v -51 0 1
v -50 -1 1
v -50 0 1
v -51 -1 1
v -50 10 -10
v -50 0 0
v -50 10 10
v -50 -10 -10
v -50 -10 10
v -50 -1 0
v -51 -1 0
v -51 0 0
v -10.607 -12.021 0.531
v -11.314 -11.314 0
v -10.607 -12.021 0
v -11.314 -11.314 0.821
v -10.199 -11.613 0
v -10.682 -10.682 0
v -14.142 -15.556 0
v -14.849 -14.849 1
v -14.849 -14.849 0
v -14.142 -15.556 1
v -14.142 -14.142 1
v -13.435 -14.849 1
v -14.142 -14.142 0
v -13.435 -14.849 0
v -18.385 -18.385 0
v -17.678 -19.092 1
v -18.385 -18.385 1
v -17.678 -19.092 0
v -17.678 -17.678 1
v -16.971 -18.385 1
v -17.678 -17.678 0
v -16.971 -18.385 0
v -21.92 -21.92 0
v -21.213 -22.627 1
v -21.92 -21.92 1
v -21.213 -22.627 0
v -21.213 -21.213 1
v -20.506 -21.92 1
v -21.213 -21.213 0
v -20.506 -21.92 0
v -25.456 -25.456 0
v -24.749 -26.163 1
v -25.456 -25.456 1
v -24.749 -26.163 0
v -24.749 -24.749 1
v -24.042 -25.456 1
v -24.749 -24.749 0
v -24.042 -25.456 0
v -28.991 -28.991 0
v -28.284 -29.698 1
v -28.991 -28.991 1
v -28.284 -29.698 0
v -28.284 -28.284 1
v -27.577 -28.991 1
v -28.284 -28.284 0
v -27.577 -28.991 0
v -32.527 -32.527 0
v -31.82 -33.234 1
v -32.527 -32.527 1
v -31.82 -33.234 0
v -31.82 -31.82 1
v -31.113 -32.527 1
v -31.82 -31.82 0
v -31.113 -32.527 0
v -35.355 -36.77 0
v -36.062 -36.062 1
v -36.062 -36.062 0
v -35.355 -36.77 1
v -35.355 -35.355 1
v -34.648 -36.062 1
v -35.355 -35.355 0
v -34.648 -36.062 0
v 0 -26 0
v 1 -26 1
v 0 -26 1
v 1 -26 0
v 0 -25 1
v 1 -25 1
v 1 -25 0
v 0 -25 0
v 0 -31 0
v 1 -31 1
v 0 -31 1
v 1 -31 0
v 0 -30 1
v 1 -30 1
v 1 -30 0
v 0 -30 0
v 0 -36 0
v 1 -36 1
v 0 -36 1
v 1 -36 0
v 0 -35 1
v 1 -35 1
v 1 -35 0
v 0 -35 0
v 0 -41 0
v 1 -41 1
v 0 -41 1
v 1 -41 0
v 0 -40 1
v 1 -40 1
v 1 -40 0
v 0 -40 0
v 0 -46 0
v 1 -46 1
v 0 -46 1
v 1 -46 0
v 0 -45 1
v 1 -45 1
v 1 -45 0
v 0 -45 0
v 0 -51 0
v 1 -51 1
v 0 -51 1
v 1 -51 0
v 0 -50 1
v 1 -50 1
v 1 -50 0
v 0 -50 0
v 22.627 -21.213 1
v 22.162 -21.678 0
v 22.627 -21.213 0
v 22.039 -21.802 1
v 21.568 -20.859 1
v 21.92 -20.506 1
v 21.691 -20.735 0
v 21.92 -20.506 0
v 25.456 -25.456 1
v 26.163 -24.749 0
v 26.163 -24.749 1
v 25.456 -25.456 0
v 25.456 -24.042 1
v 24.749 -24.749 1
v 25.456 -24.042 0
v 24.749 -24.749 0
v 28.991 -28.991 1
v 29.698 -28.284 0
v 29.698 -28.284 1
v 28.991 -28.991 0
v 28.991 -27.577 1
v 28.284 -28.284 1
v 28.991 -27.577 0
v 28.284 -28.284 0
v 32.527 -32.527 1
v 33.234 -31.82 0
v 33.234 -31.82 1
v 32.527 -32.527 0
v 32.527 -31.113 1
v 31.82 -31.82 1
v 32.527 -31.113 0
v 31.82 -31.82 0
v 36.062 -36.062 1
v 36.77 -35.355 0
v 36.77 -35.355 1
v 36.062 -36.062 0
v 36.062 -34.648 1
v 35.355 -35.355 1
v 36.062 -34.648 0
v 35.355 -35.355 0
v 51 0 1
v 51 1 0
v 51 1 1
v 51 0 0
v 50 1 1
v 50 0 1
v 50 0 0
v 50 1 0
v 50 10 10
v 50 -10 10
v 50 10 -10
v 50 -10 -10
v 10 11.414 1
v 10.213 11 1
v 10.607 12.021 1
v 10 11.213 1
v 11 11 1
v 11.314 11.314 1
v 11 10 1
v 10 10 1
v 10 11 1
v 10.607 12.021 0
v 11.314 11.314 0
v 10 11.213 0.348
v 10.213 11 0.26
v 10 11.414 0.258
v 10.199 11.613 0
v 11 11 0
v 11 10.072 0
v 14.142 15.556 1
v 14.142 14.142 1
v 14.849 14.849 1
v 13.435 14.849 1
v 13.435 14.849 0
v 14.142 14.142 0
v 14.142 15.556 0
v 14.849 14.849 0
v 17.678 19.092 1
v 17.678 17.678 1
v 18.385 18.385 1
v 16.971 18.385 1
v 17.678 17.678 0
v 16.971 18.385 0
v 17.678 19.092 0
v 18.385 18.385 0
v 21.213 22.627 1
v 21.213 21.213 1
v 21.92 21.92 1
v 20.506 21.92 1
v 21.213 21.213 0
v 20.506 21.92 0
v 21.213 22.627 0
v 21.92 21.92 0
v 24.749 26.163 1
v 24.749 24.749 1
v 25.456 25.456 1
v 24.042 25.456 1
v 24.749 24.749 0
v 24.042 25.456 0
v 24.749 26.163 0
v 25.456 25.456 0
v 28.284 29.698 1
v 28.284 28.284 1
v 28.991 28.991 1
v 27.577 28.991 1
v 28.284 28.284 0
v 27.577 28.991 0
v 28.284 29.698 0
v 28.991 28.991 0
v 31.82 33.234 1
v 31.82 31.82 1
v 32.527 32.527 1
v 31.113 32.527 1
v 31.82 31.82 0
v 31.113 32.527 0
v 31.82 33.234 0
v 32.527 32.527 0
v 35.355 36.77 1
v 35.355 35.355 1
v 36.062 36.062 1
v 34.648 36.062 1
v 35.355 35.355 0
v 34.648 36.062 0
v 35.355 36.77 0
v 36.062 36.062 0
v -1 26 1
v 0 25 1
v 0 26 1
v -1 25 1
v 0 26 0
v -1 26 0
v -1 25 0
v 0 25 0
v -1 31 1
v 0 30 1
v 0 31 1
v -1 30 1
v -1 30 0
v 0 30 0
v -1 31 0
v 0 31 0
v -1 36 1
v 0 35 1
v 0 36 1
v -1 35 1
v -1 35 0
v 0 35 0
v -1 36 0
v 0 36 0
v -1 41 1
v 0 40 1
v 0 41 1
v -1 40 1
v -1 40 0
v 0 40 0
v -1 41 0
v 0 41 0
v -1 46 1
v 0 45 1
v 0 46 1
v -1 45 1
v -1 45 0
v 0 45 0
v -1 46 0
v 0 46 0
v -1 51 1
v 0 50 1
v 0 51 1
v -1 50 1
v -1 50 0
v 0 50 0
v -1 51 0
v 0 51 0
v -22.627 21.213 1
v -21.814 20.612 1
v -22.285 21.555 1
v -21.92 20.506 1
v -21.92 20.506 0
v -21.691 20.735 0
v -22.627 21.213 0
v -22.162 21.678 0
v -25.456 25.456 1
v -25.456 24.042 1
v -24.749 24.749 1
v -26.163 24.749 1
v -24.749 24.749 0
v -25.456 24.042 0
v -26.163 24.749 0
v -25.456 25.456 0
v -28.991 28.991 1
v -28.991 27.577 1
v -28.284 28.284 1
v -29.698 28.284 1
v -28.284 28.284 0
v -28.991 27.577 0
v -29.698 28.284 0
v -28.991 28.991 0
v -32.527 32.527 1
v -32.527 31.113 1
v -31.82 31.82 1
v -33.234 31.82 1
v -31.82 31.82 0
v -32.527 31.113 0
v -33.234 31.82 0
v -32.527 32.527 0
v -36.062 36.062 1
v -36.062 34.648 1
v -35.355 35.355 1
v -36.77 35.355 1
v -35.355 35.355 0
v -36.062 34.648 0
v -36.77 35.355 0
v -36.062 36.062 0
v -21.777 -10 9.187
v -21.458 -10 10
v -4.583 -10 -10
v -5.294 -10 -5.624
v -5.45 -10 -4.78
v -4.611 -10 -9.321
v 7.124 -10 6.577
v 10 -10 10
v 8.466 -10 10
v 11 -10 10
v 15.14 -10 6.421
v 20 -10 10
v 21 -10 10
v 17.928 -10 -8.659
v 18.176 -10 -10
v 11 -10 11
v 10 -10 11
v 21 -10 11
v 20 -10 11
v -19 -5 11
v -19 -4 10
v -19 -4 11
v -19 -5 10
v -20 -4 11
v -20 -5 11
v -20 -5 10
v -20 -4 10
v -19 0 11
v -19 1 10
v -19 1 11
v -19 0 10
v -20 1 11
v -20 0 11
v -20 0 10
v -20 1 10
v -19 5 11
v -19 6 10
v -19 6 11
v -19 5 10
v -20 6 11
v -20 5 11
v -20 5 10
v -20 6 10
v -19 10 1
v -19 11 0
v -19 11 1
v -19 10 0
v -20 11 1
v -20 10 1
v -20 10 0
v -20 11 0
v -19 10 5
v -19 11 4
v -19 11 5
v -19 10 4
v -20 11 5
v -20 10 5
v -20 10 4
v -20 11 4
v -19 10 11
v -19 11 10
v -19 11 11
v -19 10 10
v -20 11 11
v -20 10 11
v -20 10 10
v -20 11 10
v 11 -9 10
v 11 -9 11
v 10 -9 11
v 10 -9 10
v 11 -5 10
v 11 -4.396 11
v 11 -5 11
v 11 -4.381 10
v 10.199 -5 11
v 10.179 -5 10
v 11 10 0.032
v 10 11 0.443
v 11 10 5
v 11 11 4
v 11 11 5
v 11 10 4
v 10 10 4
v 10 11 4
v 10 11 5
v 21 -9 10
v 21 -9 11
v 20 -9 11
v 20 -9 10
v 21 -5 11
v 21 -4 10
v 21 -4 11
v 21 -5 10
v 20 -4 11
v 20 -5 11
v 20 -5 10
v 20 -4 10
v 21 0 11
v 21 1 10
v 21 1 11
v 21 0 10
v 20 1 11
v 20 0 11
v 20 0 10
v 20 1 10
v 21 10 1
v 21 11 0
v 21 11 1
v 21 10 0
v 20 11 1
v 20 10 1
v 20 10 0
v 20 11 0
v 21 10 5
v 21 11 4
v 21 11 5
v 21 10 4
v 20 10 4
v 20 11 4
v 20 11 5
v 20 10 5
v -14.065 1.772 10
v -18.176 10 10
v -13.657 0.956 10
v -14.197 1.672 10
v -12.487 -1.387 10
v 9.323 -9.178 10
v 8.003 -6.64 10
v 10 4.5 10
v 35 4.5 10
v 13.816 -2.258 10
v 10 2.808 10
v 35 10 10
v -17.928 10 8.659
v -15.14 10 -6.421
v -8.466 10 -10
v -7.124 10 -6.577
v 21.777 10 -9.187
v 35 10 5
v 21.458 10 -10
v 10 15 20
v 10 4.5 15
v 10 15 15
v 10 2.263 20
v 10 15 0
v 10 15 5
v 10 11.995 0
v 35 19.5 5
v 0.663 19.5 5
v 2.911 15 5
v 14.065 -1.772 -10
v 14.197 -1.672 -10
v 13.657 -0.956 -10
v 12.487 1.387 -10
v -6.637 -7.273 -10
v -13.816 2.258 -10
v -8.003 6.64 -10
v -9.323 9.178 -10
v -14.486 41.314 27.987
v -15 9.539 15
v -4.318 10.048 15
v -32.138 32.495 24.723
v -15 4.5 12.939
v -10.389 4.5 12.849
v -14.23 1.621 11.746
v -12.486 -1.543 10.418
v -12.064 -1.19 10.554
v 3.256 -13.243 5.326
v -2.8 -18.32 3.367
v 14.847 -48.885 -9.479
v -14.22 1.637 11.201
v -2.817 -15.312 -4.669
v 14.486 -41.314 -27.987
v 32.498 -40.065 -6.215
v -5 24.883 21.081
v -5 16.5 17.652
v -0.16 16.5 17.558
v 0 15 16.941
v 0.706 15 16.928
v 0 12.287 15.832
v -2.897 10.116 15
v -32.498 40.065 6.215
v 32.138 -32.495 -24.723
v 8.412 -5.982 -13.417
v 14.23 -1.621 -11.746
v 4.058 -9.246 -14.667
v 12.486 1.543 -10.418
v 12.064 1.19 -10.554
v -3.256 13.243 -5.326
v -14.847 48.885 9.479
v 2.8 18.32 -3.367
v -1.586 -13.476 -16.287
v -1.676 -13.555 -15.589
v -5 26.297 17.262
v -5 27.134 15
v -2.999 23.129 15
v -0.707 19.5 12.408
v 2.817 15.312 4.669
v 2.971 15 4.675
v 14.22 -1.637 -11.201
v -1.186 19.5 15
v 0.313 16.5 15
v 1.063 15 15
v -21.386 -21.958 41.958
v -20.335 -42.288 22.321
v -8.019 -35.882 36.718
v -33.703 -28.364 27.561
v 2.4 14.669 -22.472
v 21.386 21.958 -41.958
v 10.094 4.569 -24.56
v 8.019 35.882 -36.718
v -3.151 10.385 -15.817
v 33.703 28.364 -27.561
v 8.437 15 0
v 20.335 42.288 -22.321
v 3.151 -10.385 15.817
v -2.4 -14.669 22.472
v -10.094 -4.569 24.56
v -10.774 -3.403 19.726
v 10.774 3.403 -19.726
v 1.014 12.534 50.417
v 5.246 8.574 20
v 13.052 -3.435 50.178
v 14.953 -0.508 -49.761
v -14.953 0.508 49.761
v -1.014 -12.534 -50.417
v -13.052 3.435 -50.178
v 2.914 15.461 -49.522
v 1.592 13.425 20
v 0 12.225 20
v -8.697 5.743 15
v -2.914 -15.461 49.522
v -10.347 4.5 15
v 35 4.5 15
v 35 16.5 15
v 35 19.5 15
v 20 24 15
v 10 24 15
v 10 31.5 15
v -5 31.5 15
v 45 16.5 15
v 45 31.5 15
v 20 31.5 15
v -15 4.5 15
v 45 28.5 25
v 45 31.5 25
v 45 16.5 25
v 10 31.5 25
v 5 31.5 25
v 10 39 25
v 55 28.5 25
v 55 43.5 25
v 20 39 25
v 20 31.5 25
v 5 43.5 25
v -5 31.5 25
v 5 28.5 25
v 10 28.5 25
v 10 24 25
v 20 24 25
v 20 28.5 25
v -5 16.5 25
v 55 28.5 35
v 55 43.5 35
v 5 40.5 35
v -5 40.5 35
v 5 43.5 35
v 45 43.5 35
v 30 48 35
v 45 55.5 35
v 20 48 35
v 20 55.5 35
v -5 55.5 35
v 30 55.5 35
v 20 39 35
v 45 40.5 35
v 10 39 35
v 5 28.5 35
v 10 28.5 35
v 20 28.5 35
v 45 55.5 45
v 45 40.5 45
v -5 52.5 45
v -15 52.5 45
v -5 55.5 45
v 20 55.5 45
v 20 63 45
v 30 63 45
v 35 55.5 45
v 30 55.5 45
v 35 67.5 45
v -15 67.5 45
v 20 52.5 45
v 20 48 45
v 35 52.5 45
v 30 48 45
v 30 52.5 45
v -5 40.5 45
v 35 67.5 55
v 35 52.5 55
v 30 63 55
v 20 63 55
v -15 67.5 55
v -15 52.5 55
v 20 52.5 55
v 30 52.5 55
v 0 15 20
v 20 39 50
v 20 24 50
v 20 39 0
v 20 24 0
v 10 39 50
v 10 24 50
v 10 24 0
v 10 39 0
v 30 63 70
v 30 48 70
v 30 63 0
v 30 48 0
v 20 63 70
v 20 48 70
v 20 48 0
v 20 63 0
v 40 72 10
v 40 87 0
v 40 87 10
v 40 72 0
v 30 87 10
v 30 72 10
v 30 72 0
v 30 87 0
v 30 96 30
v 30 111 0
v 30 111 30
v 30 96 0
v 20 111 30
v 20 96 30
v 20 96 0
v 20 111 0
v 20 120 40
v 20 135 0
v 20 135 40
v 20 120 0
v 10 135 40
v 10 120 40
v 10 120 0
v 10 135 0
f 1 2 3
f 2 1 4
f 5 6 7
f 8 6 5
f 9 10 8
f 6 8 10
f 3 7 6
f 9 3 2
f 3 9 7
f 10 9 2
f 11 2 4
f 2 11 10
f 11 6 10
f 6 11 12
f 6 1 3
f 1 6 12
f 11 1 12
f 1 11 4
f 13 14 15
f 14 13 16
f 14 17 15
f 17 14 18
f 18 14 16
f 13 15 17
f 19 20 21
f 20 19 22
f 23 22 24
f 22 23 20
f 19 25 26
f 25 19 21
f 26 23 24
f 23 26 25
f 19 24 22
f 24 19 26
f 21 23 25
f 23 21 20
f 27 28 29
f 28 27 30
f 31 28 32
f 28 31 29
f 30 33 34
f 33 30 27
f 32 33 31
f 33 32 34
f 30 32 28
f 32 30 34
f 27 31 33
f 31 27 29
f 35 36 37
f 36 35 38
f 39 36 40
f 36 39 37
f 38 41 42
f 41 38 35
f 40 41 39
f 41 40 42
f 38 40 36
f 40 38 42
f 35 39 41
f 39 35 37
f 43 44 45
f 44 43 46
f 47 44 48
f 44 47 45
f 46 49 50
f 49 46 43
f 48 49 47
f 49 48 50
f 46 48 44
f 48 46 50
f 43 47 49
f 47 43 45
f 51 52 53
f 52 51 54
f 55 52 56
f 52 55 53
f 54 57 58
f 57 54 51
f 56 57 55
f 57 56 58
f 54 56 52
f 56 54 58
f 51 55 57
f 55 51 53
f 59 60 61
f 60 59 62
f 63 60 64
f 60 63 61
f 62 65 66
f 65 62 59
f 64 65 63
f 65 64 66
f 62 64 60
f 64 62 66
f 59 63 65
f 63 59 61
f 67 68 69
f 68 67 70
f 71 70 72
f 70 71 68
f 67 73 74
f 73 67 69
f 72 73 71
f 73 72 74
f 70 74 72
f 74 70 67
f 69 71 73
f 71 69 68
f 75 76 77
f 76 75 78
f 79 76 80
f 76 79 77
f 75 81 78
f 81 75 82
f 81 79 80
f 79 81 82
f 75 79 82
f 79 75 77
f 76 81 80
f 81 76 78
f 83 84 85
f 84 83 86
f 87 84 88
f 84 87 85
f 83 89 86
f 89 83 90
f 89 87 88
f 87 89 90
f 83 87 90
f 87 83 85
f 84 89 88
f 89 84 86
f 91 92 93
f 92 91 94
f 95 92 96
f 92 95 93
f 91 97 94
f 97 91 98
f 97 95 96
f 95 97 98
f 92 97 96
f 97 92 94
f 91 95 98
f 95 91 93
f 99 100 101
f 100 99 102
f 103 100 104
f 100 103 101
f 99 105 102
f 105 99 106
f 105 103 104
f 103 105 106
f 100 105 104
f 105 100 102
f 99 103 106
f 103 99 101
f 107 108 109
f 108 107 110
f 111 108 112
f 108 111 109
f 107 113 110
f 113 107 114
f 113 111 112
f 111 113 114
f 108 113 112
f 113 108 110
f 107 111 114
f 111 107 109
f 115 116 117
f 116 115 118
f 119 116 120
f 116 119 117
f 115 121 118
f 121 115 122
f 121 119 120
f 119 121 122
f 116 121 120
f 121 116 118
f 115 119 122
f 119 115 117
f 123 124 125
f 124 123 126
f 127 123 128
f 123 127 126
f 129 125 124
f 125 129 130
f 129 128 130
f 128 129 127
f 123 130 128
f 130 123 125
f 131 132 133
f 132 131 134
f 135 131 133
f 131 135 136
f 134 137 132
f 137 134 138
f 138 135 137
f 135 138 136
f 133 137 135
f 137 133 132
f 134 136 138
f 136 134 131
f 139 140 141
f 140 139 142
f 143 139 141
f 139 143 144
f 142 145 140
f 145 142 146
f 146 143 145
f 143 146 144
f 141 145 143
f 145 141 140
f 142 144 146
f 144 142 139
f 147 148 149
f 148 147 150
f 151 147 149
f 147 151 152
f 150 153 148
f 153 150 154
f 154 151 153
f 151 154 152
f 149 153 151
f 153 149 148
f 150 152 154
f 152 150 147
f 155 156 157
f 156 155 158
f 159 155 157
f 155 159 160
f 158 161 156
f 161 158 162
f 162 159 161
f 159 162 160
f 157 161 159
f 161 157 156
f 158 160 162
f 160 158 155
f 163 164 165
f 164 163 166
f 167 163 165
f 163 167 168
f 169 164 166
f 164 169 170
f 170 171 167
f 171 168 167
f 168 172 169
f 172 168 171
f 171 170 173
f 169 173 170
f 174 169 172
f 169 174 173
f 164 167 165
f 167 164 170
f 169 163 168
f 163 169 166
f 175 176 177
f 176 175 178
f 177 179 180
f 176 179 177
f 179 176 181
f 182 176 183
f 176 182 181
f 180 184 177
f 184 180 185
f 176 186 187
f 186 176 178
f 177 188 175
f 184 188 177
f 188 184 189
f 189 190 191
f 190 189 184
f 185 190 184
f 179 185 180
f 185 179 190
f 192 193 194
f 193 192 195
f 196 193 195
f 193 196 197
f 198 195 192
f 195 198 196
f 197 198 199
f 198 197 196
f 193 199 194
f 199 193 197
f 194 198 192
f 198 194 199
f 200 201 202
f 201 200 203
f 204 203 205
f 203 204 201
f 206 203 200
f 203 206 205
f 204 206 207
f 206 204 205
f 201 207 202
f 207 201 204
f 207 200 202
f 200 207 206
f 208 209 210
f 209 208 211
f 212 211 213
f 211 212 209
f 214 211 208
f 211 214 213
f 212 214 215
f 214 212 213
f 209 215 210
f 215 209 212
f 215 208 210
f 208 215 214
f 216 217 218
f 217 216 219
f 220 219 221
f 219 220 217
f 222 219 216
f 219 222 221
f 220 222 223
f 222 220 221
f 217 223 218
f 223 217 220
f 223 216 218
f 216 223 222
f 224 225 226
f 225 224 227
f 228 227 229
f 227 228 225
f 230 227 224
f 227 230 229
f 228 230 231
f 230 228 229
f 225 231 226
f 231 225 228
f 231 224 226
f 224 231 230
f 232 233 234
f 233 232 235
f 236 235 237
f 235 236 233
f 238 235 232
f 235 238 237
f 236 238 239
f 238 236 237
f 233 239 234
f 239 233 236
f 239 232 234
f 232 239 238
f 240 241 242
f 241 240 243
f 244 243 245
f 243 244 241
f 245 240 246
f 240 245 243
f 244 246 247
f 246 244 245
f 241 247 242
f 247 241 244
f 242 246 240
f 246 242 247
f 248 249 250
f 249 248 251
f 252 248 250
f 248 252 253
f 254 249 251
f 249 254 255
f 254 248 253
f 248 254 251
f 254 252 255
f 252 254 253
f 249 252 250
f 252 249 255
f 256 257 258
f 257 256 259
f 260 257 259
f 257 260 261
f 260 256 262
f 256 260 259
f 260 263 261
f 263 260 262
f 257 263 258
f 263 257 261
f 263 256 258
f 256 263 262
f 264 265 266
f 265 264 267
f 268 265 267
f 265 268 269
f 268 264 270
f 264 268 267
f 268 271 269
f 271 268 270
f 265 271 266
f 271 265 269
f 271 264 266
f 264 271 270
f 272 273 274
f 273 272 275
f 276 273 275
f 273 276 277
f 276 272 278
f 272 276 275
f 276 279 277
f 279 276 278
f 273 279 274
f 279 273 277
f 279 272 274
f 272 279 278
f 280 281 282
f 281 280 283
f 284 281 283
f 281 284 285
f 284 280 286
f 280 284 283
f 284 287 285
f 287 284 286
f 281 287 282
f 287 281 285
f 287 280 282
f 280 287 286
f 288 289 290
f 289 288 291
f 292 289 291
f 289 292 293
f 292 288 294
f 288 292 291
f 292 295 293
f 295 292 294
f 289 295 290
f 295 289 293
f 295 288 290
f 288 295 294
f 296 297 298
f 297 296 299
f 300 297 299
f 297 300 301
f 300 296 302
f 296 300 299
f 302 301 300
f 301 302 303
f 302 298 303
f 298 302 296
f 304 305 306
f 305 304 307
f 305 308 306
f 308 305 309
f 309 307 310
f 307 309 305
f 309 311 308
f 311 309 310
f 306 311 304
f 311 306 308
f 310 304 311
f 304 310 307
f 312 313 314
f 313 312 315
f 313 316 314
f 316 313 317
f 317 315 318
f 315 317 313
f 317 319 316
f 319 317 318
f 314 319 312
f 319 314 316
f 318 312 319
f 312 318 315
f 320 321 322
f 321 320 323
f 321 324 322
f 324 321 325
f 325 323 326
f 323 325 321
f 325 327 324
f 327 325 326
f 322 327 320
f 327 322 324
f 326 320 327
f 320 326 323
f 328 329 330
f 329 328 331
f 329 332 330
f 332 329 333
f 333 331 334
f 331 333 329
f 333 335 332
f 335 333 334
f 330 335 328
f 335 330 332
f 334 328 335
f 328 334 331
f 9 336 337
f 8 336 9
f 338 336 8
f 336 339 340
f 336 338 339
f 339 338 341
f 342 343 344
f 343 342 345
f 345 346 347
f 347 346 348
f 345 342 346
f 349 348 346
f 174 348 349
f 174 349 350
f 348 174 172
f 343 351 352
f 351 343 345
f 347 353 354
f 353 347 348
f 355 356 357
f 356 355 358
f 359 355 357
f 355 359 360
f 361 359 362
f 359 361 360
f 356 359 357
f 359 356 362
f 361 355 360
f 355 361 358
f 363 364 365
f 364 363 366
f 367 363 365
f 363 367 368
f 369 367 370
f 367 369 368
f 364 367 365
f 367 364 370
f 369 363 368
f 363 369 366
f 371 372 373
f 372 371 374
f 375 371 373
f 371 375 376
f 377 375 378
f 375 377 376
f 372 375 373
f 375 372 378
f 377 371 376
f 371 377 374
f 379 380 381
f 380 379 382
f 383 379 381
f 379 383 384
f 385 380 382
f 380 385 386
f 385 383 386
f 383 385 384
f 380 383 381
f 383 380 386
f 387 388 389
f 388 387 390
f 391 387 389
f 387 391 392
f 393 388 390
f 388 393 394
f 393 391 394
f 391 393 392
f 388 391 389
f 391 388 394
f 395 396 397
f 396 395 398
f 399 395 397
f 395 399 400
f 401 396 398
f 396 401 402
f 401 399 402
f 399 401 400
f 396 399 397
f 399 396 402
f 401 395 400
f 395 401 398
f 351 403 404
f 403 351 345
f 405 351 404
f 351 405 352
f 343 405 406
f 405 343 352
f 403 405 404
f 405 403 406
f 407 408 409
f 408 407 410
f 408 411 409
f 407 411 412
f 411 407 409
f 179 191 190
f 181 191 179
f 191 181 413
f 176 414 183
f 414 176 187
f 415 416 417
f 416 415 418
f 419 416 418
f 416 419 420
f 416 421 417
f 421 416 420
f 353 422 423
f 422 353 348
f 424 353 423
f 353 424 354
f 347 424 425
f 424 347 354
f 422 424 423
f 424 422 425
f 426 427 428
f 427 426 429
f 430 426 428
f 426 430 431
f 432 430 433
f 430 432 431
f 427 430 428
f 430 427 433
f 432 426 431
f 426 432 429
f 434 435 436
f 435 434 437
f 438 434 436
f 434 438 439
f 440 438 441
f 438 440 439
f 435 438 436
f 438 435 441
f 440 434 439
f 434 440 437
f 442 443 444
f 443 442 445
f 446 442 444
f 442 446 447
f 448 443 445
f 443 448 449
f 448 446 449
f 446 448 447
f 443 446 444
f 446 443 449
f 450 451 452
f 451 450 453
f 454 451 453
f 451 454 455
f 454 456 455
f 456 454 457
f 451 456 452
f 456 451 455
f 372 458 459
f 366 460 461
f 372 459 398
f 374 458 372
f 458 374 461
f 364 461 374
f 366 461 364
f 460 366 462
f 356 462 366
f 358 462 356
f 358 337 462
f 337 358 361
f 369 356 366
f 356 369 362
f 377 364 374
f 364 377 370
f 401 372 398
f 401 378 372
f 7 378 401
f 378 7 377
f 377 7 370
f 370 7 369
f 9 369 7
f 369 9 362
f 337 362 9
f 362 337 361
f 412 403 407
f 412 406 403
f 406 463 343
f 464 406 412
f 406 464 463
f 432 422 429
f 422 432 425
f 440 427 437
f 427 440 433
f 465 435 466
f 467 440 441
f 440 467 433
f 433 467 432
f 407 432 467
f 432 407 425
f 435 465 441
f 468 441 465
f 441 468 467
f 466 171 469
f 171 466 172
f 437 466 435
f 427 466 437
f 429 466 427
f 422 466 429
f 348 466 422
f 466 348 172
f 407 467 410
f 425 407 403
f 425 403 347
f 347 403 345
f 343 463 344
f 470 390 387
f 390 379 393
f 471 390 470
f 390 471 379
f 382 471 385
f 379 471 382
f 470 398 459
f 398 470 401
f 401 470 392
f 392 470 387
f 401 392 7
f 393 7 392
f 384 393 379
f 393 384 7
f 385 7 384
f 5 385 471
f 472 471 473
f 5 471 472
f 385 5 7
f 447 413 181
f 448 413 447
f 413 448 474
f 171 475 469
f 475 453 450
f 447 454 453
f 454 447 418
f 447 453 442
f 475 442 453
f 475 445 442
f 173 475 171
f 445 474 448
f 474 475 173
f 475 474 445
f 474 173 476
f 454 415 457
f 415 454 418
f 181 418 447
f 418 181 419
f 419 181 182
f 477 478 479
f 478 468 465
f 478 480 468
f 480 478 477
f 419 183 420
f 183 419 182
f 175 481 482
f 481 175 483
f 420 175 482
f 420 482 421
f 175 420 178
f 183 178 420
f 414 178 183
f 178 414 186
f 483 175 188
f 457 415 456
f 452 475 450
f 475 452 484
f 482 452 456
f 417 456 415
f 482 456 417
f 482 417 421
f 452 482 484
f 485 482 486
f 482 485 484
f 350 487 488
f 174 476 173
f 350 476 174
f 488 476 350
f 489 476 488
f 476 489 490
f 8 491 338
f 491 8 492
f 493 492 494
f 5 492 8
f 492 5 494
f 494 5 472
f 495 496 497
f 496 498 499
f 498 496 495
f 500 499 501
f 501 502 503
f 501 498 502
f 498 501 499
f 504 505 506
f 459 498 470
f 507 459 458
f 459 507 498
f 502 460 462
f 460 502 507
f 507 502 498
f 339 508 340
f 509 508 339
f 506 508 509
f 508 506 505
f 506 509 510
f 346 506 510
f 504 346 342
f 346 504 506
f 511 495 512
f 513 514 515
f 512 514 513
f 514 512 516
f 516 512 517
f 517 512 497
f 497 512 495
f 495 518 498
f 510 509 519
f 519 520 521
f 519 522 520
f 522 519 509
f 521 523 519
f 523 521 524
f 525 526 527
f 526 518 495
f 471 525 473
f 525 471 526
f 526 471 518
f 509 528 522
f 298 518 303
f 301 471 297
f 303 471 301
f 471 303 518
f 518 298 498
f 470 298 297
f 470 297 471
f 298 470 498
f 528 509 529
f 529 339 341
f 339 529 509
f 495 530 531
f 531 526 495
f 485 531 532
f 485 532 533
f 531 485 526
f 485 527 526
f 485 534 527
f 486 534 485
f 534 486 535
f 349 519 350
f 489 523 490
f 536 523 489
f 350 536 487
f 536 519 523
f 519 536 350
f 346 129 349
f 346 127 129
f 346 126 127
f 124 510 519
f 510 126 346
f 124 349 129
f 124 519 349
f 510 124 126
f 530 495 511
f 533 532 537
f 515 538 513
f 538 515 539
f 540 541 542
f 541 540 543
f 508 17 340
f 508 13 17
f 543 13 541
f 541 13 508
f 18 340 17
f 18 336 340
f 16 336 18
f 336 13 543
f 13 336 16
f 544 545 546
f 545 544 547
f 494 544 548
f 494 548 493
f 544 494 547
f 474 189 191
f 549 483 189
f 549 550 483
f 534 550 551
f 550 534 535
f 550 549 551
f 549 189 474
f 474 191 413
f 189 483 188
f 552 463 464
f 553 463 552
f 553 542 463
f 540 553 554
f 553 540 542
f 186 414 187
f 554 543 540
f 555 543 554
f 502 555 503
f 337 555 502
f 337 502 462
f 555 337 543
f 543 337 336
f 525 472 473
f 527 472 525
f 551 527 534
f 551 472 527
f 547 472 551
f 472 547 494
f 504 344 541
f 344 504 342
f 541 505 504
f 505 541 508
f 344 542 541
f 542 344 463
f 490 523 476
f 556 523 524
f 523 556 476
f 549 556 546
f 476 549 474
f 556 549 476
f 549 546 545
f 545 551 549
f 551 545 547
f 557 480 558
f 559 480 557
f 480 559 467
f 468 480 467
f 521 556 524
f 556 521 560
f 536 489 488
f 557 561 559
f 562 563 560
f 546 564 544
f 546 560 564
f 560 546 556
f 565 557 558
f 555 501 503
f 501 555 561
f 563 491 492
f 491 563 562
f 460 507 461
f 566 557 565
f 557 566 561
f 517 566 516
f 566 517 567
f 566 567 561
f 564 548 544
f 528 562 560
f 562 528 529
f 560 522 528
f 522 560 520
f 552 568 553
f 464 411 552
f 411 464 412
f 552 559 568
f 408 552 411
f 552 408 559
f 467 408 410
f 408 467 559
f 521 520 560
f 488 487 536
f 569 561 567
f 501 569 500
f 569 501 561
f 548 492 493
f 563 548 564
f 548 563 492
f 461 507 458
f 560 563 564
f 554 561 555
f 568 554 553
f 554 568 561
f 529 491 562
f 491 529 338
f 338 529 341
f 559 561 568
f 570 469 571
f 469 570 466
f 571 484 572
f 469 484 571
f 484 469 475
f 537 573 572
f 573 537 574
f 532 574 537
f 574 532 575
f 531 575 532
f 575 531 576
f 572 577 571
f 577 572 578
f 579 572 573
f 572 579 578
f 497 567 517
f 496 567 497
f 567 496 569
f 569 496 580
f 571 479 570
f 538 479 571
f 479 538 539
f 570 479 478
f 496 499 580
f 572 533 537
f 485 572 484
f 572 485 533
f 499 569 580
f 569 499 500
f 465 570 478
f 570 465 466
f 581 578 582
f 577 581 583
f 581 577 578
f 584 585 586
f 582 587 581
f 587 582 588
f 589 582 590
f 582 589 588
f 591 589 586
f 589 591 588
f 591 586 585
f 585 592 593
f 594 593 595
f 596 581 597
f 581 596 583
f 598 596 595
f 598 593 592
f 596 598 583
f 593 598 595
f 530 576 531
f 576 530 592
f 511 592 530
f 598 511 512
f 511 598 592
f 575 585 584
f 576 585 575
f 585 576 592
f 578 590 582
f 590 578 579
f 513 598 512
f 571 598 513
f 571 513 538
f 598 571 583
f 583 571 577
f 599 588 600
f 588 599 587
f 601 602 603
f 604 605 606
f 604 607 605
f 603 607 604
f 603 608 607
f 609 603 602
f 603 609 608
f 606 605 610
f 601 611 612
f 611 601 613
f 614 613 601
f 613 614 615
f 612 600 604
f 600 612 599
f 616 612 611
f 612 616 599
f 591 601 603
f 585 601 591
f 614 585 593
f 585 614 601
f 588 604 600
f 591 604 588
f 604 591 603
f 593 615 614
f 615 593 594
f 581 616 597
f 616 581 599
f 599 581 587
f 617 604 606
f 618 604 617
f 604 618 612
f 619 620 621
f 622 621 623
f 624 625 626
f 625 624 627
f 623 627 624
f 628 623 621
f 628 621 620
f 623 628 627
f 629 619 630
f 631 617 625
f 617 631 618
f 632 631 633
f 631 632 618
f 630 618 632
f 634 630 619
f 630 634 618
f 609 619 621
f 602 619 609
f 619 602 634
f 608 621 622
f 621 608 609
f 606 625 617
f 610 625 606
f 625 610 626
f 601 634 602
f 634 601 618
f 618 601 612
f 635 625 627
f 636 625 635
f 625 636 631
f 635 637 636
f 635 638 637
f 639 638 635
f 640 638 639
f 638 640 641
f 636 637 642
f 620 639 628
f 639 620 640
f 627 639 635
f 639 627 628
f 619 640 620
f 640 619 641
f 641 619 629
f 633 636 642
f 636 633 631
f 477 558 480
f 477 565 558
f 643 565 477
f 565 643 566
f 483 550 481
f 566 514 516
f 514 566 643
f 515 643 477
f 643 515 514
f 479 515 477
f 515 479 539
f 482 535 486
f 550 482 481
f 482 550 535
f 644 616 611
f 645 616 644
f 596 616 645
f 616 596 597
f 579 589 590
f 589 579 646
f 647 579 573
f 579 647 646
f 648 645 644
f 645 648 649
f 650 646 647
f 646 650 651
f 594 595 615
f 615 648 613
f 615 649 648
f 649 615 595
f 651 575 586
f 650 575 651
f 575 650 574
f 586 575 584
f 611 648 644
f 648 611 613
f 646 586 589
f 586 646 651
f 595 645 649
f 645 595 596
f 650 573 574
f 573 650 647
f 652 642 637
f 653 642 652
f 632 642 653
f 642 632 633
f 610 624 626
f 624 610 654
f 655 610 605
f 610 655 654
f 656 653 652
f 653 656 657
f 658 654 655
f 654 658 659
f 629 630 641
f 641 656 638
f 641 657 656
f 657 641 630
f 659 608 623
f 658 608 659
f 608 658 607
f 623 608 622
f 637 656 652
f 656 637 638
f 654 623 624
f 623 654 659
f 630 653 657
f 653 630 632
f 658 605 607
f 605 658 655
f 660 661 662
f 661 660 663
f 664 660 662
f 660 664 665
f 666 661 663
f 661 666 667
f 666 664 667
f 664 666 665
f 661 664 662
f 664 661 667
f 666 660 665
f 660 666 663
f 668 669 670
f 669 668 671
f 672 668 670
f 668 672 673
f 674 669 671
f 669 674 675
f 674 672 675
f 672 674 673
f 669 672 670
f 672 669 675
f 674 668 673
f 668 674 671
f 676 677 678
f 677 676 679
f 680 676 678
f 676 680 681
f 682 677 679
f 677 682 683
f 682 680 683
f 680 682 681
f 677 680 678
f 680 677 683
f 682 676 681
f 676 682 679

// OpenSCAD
/*
 * statements: for statement
 *
 * Copyright © 2022 Giampiero Gabbiani (giampiero@gabbiani.org)
 *
 * This file is part of the 'AutoDox' (ADOX) project.
 *
 * ADOX is free software: you can redistribute it and/or modify
 * it under the terms of the GNU General Public License as published by
 * the Free Software Foundation, either version 3 of the License, or
 * (at your option) any later version.
 *
 * ADOX is distributed in the hope that it will be useful,
 * but WITHOUT ANY WARRANTY; without even the implied warranty of
 * MERCHANTABILITY or FITNESS FOR A PARTICULAR PURPOSE.  See the
 * GNU General Public License for more details.
 *
 * You should have received a copy of the GNU General Public License
 * along with ADOX.  If not, see <http://www.gnu.org/licenses/>.
 */

for (a =[3:5])echo(a);     // 3 4 5
for (a =[3:0]){echo(a);}   // 0 1 2 3         start > end is invalid, deprecated by 2015.3
for (a =[3:0.5:5])echo(a); // 3 3.5 4 4.5 5
for (a =[0:2:5])echo(a);   // 0 2 4           a never equals end
for (a =[3:-2:-1])echo(a); // 3 1 -1          negative increment requires 2015.3 be sure end < start

for (a =[3,4,1,5])echo(a); // 3 4 1 5
for (a =[0.3,PI,1,99]){echo(a);}    // 0.3 3.14159 1 99
x1=2; x2=8; x3=5.5;
for (a =[x1,x2,x3]){echo(a);} // 2 8 5.5
for (a =[[1,2],6,"s",[[3,4],[5,6]]])echo(a);  // [1,2] 6 "s" [[3,4],[5,6]]

animals = ["elephants", "snakes", "tigers", "giraffes"];
for(animal = animals)
    echo(str("I've been to the zoo and saw ", animal));
 // "I've been to the zoo and saw elephants", for each animal

for (i=[0:3])
    translate([i*10,0,0])
        cube(i+1);

// nested for
for(z=[-180:45:+180])
    for(x=[10:5:50])
        rotate([0,0,z]) translate([x,0,0]) cube(1);

// example for() nested 3 deep

color_vec = ["black","red","blue","green","pink","purple"];
for (x = [-20:10:20] )
    for (y = [0:4] )
        color(color_vec[y])
            for (z = [0,4,10] ) {
                translate([x,y*5-10,z])
                    cube();
            }

// shorthand nesting for same result

color_vec = ["black","red","blue","green","pink","purple"];
for (x = [-20:10:20],
    y = [0:4],
    z = [0,4,10] )
        translate([x,y*5-10,z]){color(color_vec[y])cube();}

// example 1 - iteration over a vector of vectors (rotation)
for(i = [ [  0,  0,   0],
    [ 10, 20, 300],
    [200, 40,  57],
    [ 20, 88,  57] ])
{
    rotate(i)
    cube([100, 20, 20], center = true);
}


// example 2 for() loop vector of vectors (translation)
for(i = [ [ 0,  0,  0],
        [10, 12, 10],
        [20, 24, 20],
        [30, 36, 30],
        [20, 48, 40],
        [10, 60, 50] ])
{
    translate(i)
    cube([50, 15, 10], center = true);
}

// example 3 for() loop vector of vectors
for(i = [ [[ 0,  0,  0], 20],
          [[10, 12, 10], 50],
          [[20, 24, 20], 70],
          [[30, 36, 30], 10],
          [[20, 48, 40], 30],
          [[10, 60, 50], 40] ])
{
  translate([i[0][0], 2*i[0][1], 0])
  cube([10, 15, i[1]]);
}

// example 1 - loop over a range:
intersection_for(n = [1 : 6])
{
    rotate([0, 0, n * 60])
    {
        translate([5,0,0])
        sphere(r=12);
    }
}

// example 2 - rotation :
 intersection_for(i = [ [  0,  0,   0],
 			[ 10, 20, 300],
 			[200, 40,  57],
 			[ 20, 88,  57] ])
{
    rotate(i)
    cube([100, 20, 20], center = true);
}
